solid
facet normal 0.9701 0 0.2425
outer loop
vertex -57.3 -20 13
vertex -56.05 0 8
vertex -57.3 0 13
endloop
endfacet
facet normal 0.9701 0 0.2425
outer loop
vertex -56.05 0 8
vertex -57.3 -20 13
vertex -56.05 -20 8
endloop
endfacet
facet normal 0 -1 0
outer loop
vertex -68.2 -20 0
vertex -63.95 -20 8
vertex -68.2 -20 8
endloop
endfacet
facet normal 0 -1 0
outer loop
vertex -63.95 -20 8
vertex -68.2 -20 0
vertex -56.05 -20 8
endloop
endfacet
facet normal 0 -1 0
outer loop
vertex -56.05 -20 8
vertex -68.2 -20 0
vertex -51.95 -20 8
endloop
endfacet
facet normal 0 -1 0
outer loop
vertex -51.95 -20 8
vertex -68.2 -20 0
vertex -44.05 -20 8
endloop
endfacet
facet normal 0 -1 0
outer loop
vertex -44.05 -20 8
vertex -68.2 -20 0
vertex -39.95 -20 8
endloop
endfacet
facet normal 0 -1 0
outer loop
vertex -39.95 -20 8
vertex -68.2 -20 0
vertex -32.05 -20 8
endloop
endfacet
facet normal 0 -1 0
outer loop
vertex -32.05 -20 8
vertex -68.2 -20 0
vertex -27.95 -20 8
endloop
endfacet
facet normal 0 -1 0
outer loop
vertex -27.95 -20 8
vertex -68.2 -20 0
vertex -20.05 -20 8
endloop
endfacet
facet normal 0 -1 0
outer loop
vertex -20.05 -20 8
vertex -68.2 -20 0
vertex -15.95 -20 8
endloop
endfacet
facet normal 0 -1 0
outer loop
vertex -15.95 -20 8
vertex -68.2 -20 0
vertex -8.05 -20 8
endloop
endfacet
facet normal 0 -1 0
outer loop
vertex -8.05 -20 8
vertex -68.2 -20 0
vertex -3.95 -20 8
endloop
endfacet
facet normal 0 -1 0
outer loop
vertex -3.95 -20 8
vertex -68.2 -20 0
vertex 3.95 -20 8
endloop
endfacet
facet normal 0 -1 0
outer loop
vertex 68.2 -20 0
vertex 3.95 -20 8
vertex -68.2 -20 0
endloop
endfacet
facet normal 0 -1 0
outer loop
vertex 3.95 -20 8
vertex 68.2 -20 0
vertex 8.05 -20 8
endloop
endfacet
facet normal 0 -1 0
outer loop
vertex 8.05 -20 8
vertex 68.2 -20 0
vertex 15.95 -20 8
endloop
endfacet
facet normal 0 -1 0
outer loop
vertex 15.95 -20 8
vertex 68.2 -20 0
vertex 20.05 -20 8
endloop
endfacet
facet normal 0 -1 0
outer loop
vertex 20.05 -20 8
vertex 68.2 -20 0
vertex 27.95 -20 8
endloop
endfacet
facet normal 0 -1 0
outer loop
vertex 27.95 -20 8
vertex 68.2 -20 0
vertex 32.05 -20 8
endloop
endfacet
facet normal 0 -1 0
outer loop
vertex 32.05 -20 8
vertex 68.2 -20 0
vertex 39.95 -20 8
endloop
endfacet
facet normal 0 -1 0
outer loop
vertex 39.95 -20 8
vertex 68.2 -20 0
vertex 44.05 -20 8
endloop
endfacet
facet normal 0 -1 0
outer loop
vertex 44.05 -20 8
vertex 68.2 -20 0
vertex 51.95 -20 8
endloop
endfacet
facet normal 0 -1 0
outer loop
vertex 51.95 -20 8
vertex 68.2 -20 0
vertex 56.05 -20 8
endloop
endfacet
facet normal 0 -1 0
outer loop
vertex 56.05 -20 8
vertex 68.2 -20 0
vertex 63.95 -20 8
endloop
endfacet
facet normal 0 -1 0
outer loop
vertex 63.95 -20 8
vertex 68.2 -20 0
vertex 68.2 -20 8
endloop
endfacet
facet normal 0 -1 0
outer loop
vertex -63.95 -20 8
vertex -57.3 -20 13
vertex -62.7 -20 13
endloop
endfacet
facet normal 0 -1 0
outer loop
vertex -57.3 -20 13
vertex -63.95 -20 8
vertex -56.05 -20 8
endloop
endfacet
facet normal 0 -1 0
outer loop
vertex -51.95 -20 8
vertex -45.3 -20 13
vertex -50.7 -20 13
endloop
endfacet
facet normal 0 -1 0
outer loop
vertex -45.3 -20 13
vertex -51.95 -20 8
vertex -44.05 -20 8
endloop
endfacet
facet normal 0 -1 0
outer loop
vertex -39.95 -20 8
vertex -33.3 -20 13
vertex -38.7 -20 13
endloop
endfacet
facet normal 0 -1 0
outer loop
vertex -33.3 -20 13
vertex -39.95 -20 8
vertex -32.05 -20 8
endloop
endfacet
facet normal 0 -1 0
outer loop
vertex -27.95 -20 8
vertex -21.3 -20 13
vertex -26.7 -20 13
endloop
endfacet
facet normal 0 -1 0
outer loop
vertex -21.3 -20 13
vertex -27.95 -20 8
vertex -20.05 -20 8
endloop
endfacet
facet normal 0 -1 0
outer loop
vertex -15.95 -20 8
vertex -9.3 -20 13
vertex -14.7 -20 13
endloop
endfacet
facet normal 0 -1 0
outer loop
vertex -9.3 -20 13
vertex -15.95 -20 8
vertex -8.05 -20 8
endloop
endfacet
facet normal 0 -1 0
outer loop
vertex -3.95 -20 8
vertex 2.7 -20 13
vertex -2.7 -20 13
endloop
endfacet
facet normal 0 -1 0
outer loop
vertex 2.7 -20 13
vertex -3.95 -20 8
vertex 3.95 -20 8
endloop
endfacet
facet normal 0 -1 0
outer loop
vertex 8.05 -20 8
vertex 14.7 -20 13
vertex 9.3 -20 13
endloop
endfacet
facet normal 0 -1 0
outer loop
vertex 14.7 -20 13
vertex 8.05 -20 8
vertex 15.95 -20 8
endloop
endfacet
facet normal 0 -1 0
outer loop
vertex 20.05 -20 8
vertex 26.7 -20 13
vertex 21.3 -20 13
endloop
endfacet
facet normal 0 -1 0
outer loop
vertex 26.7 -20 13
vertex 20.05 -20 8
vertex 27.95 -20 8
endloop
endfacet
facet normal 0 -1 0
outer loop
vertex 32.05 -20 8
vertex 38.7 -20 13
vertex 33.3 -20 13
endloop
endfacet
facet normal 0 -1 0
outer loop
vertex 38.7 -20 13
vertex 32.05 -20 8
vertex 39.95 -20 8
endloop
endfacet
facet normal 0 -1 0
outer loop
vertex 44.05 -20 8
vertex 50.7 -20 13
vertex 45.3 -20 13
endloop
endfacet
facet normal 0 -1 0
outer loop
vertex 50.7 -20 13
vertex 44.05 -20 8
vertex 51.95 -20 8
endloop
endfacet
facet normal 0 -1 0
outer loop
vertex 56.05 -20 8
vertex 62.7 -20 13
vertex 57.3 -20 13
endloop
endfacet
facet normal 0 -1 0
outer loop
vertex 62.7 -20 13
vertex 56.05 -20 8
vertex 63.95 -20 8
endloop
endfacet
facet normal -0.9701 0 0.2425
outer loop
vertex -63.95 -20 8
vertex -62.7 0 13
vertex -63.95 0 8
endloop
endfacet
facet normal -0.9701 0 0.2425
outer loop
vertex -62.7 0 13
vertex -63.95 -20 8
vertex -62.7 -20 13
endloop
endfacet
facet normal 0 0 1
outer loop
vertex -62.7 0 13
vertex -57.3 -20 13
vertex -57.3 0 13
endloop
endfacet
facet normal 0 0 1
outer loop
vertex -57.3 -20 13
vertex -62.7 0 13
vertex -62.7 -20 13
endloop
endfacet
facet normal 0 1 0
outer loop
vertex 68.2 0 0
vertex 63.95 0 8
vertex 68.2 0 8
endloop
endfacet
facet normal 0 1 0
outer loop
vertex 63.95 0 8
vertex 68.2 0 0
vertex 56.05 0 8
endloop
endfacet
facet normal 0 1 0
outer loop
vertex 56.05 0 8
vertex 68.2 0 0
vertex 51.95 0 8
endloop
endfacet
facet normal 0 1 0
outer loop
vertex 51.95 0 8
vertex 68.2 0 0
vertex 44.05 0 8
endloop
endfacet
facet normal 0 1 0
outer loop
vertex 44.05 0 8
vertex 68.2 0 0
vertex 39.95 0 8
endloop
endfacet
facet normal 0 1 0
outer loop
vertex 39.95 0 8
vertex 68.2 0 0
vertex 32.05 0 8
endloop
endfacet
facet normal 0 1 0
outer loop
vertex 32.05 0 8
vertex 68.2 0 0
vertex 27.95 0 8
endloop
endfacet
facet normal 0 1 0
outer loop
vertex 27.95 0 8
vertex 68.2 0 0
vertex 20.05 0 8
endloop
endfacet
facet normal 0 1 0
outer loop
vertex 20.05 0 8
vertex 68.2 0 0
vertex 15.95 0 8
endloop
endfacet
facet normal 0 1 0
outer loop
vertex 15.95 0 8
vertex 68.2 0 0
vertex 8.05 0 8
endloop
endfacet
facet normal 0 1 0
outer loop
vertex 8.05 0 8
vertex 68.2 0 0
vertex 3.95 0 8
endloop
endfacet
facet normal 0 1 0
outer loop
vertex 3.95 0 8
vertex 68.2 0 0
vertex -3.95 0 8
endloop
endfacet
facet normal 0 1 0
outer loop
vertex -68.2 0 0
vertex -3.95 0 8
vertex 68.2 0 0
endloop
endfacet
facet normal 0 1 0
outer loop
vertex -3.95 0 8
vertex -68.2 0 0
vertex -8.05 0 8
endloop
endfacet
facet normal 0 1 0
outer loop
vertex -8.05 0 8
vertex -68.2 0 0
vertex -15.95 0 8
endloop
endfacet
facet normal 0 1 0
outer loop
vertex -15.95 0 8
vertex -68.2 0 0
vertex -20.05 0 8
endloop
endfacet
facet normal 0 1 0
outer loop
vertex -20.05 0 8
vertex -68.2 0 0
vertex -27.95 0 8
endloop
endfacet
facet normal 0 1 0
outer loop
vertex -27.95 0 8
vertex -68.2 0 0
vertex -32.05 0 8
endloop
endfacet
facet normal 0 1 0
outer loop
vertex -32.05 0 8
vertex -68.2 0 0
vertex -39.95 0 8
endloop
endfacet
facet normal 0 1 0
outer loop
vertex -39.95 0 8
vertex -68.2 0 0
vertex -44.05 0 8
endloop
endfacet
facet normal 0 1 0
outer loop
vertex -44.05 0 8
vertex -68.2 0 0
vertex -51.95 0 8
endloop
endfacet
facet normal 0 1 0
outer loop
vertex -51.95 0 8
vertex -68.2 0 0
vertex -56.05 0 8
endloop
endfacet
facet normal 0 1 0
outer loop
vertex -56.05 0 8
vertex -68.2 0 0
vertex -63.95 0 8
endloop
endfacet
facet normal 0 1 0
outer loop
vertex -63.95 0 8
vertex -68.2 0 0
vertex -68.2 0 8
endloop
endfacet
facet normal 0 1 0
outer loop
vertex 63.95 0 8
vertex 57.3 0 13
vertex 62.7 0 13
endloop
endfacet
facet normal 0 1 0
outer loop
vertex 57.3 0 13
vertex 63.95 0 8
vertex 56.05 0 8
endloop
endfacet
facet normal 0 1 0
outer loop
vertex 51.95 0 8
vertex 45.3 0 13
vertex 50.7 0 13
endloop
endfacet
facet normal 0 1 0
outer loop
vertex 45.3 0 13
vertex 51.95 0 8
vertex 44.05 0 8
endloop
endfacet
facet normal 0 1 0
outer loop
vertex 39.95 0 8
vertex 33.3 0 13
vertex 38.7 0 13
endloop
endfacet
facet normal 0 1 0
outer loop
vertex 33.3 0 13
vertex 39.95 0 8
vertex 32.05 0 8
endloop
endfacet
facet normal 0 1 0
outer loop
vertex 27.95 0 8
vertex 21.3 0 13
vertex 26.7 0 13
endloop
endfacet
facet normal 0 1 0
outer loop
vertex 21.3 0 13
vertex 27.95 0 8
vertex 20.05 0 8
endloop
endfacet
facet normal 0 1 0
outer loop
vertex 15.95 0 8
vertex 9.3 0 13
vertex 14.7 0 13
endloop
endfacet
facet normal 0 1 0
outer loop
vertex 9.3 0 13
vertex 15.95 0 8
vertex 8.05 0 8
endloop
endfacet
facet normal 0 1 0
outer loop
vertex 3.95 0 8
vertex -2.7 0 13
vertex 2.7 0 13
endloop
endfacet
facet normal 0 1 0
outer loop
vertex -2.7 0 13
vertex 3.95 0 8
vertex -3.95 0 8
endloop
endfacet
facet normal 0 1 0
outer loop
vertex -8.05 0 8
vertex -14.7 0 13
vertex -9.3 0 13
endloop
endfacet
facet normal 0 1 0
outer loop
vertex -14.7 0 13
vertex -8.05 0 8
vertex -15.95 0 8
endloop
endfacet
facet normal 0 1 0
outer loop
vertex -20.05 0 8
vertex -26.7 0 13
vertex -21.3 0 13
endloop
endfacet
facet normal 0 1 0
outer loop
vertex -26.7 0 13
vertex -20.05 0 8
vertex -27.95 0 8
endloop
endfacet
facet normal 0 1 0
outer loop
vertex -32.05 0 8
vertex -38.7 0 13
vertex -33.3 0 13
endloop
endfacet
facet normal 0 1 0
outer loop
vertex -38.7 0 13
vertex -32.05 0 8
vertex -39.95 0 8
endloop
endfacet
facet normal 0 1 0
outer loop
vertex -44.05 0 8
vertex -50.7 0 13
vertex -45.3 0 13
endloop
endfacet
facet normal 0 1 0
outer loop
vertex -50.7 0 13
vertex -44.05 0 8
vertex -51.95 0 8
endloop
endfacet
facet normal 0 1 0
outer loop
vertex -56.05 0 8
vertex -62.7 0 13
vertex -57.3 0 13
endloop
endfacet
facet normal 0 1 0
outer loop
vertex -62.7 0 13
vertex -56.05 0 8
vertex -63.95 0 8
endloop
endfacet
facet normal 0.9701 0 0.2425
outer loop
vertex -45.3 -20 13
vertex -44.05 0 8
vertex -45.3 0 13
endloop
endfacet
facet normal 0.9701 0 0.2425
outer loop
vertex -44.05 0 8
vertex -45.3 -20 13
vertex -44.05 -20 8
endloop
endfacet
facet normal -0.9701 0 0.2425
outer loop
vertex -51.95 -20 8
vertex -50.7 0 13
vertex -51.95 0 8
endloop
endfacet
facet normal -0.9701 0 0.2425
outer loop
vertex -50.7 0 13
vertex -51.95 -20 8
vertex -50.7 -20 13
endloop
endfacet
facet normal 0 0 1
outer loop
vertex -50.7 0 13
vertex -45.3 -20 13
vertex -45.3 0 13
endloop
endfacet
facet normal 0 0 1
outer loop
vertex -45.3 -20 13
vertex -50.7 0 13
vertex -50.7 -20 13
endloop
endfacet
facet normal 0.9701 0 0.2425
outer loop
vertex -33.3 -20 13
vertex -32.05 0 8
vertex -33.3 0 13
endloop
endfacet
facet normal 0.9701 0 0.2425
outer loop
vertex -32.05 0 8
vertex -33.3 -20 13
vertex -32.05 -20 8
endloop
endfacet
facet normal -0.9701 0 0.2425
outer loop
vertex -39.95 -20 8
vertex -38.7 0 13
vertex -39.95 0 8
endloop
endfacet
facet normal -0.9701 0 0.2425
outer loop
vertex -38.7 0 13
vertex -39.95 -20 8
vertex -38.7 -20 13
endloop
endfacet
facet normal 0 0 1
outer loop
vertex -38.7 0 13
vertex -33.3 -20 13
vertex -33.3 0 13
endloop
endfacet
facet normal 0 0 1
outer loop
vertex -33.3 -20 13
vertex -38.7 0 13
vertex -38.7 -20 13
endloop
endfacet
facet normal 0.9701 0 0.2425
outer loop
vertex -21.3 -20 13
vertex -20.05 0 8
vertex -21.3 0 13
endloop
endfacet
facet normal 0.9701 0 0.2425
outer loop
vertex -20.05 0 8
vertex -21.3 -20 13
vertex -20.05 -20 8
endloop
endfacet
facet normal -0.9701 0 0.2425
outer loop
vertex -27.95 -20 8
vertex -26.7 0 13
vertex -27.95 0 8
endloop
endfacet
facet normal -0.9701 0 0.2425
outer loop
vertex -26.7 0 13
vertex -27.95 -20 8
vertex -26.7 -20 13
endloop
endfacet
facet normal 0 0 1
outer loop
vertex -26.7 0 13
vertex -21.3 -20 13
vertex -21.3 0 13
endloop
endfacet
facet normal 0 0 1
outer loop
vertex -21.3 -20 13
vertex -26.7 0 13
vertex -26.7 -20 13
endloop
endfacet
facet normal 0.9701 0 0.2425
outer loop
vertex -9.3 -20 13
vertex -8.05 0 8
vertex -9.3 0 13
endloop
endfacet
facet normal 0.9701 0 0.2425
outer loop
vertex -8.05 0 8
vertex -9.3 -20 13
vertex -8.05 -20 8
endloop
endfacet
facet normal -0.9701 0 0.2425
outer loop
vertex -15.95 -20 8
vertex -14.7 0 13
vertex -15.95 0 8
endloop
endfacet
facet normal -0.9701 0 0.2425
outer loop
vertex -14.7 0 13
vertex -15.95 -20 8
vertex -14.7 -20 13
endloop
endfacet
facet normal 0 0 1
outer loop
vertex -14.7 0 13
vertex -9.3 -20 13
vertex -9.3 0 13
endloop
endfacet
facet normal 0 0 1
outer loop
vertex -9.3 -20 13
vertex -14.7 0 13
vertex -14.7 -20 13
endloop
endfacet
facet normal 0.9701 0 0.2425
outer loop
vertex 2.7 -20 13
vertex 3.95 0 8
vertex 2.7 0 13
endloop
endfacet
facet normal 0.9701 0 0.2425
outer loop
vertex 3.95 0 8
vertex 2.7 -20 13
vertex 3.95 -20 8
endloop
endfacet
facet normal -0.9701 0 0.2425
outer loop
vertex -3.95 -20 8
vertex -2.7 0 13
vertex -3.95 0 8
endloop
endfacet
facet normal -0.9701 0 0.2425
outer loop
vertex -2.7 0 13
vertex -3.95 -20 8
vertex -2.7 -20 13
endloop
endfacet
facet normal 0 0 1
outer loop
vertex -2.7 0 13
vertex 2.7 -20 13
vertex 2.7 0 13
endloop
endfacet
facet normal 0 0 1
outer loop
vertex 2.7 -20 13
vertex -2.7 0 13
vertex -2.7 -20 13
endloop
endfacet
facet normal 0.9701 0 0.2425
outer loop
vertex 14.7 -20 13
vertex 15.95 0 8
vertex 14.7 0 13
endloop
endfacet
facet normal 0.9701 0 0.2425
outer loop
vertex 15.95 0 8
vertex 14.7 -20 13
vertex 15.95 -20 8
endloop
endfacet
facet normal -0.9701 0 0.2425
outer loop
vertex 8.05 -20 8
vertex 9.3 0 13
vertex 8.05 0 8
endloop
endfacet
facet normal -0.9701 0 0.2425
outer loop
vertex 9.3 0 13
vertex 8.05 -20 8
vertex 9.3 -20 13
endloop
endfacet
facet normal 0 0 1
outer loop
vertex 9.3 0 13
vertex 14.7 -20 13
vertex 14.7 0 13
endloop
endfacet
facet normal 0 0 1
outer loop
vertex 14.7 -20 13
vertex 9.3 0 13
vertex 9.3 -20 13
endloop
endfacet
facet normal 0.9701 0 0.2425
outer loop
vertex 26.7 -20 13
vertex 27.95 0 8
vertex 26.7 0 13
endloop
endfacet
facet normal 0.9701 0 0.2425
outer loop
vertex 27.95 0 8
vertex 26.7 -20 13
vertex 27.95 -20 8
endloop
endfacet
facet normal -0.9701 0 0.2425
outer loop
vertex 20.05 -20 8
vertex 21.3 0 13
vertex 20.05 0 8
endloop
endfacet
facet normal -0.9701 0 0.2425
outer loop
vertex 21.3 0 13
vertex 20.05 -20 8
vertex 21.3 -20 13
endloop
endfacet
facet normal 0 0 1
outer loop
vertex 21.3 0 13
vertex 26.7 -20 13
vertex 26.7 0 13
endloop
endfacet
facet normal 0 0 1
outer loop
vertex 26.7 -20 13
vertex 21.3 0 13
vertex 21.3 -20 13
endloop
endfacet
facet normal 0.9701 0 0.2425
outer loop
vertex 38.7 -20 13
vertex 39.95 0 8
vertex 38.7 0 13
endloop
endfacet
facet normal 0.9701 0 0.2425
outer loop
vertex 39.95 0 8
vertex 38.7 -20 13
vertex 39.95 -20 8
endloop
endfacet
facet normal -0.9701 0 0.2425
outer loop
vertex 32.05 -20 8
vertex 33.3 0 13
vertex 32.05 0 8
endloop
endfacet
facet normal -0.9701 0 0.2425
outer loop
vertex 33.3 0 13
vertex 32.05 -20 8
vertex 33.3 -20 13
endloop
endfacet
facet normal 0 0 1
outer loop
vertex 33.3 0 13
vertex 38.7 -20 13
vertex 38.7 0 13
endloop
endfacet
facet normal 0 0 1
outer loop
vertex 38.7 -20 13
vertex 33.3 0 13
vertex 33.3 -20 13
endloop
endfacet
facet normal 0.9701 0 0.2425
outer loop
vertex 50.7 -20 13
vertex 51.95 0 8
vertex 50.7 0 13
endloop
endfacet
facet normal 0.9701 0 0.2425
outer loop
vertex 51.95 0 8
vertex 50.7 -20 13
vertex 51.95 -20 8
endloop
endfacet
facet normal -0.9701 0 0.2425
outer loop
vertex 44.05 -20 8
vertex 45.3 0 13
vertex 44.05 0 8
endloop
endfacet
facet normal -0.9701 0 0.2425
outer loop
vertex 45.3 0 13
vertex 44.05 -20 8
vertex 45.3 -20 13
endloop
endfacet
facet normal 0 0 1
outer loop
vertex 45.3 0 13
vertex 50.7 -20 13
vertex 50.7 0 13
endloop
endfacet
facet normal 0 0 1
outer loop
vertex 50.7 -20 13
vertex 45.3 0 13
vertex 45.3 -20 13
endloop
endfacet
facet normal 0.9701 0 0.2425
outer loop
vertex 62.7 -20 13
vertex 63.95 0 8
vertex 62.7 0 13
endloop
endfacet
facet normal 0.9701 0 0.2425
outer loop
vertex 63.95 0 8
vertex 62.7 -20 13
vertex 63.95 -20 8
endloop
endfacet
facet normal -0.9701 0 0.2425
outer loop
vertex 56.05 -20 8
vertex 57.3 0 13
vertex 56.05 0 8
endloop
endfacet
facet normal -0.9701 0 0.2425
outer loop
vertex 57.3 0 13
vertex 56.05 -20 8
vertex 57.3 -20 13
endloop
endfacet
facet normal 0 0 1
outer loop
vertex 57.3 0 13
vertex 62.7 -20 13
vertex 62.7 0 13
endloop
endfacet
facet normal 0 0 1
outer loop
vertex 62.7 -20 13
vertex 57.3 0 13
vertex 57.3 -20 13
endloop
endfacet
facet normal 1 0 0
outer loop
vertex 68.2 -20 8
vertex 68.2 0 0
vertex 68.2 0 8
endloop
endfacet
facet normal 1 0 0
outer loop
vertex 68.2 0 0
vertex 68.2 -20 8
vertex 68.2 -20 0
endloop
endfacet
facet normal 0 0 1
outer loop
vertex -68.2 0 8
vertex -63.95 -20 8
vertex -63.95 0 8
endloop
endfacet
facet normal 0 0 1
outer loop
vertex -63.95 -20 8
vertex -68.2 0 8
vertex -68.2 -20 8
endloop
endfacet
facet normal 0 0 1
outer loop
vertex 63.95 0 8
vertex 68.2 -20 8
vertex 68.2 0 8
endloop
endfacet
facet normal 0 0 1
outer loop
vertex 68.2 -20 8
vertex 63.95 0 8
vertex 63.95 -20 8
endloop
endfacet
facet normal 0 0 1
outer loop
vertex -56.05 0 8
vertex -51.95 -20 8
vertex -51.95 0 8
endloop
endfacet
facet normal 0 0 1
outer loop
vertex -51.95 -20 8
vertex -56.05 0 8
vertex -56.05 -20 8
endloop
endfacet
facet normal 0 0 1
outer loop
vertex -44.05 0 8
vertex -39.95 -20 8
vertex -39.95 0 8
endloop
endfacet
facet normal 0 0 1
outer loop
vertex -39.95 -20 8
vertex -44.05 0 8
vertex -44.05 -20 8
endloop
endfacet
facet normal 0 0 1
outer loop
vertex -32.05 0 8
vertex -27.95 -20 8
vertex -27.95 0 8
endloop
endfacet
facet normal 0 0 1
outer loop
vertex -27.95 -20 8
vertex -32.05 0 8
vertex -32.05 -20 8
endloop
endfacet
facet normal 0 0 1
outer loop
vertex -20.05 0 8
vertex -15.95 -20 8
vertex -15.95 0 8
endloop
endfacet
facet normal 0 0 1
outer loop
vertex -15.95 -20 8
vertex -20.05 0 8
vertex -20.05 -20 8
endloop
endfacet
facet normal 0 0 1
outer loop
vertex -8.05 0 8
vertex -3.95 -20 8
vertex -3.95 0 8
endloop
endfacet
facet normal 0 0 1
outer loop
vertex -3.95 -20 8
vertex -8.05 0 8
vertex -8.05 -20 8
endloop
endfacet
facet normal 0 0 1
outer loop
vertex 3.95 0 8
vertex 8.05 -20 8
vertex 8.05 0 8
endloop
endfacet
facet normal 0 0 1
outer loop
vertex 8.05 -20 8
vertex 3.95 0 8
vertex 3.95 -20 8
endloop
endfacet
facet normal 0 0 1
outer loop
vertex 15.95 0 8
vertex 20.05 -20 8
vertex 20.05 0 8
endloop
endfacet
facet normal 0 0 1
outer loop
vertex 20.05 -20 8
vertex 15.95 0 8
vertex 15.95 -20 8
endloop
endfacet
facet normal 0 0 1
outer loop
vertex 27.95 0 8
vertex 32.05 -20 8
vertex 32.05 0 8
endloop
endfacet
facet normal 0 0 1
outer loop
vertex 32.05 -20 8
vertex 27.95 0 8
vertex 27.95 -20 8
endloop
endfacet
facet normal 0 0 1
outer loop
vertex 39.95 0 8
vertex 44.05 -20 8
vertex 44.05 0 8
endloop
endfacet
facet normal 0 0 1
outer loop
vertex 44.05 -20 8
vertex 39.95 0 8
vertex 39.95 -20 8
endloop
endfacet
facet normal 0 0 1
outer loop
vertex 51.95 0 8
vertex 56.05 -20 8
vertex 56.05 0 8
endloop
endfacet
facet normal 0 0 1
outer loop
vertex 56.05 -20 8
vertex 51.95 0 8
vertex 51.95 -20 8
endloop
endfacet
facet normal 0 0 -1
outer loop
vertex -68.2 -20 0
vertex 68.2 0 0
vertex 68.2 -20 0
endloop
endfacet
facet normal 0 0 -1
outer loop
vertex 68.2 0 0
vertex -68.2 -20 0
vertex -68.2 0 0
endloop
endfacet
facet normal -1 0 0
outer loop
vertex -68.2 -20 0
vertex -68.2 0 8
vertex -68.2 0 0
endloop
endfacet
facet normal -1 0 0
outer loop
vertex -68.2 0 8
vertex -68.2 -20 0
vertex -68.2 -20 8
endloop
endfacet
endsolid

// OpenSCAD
$fn = 32;

// ----------------------------------------------------------------------
// Toothed rack, 11 teeth
// 12 mm pitch, 5 mm teeth
// ----------------------------------------------------------------------

// --- parameters (mm) ---
bar_w = 20;     // bar width (Y)
bar_h = 8;      // bar height (Z)
teeth = 11;     // number of teeth
pitch = 12;     // tooth pitch
tooth_h = 5;    // tooth height above the bar
root_w = 8.4;   // tooth width at the root
crest_w = 5.4;  // tooth width at the crest

// --- derived feature positions (mm) ---
span = (teeth - 1) * pitch;  // = 120   distance between the outer teeth
bar_l = span + root_w + 8;   // = 136.4   bar length: teeth plus 4 mm at each end
tooth_x = -span / 2;         // = -60   X of the first tooth
height = bar_h + tooth_h;    // = 13   overall height
feature_centers = [
  [tooth_x + 0 * pitch, -bar_w / 2],
  [tooth_x + 1 * pitch, -bar_w / 2],
  [tooth_x + 2 * pitch, -bar_w / 2],
  [tooth_x + 3 * pitch, -bar_w / 2],
  [tooth_x + 4 * pitch, -bar_w / 2],
  [tooth_x + 5 * pitch, -bar_w / 2],
  [tooth_x + 6 * pitch, -bar_w / 2],
  [tooth_x + 7 * pitch, -bar_w / 2],
  [tooth_x + 8 * pitch, -bar_w / 2],
  [tooth_x + 9 * pitch, -bar_w / 2],
  [tooth_x + 10 * pitch, -bar_w / 2]
];   // tooth centre line, drives the tooth loop

// bar with a rack of teeth, one extruded trapezoium per centre
module rack_tooth() {
  linear_extrude(height = bar_w)
    polygon(points = [
      [0, 0],
      [root_w, 0],
      [root_w / 2 + crest_w / 2, tooth_h + 1],
      [root_w / 2 - crest_w / 2, tooth_h + 1]
    ]);
}

union() {
  translate([-bar_l / 2, -bar_w, 0]) cube([bar_l, bar_w, bar_h]);
  for (centre = feature_centers)
    translate([centre[0] - root_w / 2, 0, bar_h - 1]) rotate([90, 0, 0]) rack_tooth();
}
